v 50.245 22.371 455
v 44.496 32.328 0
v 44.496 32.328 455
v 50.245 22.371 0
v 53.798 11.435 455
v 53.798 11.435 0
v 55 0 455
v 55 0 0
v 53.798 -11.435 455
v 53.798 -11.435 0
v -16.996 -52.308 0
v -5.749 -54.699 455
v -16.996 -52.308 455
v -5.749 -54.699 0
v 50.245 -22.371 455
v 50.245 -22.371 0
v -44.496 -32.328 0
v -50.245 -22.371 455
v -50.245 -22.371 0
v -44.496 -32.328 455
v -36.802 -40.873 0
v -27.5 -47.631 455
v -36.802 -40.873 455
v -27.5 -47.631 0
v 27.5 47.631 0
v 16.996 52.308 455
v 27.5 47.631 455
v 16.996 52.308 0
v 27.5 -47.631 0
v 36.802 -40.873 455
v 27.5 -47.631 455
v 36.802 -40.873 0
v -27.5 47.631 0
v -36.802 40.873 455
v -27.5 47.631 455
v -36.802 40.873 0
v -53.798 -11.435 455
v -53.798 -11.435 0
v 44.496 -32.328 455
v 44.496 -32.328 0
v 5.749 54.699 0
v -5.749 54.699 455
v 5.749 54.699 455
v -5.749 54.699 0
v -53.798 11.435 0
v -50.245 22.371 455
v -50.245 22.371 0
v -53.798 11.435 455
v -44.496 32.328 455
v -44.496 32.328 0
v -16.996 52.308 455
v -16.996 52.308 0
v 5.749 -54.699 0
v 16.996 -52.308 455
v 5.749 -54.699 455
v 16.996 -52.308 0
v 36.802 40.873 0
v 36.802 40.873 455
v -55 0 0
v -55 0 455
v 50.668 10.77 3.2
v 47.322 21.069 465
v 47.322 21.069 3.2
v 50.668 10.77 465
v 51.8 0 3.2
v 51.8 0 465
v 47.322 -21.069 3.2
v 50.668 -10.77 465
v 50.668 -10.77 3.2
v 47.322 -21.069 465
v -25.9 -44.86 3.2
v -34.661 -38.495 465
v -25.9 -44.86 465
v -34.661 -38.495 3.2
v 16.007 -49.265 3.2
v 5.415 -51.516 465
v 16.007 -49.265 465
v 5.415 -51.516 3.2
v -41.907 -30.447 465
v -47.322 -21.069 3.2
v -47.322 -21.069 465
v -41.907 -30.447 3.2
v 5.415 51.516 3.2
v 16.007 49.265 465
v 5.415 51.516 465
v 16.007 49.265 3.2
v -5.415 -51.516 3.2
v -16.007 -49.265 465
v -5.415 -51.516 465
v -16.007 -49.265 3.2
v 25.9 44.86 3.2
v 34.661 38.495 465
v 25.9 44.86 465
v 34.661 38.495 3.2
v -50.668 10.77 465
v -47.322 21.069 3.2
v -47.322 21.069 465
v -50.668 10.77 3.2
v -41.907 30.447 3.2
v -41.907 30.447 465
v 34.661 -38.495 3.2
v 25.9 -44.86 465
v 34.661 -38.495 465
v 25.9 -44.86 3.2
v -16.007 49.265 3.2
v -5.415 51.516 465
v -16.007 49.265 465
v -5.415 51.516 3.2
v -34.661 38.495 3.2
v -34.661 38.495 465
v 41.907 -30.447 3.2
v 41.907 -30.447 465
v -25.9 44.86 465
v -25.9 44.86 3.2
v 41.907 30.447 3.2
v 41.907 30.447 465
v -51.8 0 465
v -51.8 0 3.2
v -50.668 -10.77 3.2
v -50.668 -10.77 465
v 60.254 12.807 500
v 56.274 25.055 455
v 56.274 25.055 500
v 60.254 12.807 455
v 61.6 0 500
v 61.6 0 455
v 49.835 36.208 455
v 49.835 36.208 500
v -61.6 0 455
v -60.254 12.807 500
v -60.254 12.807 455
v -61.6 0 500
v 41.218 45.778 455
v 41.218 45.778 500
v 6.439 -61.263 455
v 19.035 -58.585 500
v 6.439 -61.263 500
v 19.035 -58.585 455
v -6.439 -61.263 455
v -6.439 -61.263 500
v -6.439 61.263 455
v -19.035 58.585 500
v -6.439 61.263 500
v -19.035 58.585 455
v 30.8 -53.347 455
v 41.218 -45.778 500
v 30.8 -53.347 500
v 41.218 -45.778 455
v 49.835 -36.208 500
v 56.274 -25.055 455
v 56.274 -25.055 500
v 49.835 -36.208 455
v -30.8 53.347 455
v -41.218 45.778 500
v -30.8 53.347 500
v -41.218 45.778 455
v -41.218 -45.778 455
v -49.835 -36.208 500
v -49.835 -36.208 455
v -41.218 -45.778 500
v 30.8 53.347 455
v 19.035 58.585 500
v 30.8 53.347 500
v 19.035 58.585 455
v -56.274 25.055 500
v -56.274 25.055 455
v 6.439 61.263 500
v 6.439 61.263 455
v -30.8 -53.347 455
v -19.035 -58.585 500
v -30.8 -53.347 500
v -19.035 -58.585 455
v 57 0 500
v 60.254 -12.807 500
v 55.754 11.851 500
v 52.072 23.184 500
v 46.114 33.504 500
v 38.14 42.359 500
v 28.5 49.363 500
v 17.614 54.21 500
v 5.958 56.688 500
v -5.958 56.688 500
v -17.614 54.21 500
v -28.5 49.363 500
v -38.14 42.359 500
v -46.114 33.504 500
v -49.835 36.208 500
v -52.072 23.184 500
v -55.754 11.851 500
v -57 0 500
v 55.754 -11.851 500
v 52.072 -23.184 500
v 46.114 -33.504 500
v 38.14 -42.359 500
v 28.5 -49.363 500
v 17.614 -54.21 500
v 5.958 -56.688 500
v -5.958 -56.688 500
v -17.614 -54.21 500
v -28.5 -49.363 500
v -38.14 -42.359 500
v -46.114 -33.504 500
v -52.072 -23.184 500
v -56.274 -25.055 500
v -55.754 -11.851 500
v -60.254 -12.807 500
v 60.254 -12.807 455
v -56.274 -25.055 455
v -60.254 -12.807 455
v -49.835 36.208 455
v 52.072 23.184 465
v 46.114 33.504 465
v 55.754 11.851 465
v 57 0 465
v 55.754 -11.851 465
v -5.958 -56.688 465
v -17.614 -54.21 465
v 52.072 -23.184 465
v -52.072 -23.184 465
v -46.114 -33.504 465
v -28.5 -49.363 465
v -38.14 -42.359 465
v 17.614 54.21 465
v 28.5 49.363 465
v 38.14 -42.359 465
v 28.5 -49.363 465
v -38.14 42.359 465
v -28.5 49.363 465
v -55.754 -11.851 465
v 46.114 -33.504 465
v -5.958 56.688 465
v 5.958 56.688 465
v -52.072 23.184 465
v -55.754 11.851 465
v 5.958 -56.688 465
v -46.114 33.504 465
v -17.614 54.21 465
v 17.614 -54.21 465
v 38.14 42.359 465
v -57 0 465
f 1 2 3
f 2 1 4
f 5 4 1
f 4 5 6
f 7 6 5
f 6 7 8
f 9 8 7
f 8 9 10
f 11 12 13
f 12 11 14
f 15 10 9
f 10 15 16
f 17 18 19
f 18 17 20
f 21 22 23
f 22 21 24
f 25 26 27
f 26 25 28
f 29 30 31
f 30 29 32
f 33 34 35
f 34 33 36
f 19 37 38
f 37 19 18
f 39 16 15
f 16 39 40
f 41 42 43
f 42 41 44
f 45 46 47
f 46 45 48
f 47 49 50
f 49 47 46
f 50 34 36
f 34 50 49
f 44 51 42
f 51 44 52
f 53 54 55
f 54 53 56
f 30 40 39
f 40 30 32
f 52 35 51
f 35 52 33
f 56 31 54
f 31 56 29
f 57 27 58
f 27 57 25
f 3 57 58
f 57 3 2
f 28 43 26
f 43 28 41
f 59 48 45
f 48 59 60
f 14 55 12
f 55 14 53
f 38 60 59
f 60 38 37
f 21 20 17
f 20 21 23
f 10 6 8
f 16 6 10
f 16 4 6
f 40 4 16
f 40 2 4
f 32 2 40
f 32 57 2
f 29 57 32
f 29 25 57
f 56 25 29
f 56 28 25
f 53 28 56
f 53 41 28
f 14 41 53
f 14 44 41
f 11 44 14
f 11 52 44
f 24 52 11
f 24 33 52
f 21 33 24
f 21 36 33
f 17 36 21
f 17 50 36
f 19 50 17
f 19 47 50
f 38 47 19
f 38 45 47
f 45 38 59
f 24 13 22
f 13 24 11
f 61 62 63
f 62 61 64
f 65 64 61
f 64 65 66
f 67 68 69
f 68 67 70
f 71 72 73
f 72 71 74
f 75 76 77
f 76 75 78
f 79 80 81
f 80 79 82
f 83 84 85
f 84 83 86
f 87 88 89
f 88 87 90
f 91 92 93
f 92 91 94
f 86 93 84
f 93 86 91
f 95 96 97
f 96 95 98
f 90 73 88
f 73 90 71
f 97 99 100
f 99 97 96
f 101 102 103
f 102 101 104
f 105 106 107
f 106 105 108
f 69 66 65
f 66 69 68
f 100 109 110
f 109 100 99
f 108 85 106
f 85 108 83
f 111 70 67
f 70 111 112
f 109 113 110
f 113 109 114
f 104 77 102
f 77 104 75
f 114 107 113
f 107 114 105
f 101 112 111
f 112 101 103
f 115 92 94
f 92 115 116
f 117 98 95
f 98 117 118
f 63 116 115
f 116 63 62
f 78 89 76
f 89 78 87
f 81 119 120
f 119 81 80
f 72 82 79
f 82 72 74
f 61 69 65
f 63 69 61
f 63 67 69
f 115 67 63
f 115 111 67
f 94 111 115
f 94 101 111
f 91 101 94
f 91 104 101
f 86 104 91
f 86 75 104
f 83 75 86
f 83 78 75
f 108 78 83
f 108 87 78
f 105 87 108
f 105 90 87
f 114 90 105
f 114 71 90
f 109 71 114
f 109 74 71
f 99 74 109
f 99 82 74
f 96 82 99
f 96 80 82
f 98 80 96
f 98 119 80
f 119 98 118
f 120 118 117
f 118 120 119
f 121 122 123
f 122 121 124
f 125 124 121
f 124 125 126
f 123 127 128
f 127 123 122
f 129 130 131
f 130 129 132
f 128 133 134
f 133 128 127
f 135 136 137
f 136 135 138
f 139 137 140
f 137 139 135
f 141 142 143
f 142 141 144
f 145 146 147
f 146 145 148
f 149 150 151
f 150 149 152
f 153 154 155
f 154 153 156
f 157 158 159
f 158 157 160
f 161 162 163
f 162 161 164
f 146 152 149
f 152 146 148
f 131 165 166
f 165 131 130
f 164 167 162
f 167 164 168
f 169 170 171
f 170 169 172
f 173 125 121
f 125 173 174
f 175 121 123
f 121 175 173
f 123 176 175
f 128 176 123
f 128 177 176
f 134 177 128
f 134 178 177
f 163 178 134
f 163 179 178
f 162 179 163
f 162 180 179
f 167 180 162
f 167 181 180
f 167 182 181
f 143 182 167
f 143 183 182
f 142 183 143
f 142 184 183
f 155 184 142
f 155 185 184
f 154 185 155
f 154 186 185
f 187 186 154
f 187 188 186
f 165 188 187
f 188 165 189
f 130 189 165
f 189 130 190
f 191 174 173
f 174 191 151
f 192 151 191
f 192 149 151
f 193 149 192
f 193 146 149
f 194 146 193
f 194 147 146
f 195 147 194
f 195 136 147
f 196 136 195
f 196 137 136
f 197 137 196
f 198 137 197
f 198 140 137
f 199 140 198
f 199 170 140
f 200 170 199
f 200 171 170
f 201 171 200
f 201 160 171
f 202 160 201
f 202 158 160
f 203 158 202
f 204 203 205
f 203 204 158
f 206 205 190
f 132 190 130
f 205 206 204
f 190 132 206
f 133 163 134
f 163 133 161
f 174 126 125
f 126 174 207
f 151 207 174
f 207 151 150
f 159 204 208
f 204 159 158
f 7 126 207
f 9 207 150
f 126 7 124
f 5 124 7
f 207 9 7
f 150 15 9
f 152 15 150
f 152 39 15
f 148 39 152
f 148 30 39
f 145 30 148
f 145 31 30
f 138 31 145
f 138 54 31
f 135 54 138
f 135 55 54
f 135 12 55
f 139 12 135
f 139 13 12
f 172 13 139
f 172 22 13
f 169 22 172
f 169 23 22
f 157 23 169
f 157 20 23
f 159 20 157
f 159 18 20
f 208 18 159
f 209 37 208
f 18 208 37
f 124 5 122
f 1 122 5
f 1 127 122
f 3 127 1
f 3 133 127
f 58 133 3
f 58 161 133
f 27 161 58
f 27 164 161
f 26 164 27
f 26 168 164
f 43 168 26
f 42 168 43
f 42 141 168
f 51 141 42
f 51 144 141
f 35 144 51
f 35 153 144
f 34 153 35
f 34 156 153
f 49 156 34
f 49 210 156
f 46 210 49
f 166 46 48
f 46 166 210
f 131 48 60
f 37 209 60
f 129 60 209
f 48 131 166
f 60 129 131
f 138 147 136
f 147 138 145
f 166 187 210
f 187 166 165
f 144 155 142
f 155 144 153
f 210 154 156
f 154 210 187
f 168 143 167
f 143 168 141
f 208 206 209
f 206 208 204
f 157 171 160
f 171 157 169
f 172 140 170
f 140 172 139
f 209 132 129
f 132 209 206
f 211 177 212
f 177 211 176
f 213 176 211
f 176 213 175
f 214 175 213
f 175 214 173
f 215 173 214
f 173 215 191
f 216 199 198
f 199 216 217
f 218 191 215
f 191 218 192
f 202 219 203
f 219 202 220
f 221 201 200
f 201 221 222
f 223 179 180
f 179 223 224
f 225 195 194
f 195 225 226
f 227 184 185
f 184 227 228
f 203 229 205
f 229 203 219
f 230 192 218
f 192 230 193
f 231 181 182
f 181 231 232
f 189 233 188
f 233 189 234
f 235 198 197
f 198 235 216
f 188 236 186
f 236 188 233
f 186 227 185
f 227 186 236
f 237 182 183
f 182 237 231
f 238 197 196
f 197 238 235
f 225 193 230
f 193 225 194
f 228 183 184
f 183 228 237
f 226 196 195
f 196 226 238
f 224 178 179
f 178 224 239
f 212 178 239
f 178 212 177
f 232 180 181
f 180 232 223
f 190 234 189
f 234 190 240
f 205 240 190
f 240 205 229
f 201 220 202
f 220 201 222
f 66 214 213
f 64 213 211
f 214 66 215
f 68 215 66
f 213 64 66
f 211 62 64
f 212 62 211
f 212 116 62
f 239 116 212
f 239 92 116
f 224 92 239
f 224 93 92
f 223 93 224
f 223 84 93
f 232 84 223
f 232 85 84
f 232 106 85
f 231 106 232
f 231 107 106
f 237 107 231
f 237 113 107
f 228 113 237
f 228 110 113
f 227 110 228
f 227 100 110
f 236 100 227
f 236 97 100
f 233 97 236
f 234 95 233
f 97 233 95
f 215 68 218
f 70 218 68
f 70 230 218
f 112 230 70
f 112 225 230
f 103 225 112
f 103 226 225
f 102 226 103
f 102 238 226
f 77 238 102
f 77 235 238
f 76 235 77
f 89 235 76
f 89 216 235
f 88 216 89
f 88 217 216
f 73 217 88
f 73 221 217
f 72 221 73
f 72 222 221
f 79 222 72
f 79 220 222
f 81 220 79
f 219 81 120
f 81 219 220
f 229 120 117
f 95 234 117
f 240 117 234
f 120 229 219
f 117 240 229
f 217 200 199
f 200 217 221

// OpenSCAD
// Parameters
length_mm = 500; //[250:1000:1]
pipe_od_mm = 110; //[90:160:1]
wall_thickness_mm = 3.2; //[1.6:6.4:0.1]
include_end_fitting = 1; //[0:1:1]
fitting_length_mm = 45; //[25:90:1]
fitting_od_scale = 1.12; //[1.05:1.25:0.01]
socket_wall_extra_mm = 2.0; //[0.5:5.0:0.1]
socket_depth_mm = 35; //[15:70:1]
overlap_mm = 1.0; //[0.5:2.0:0.1]

// Module for the HT Pipe
module ht_pipe() {
  color([0.85, 0.85, 0.8]) { // PVC color
    // Hollow tube body
    difference() {
      cylinder(r=pipe_od_mm/2, h=length_mm - include_end_fitting*fitting_length_mm + overlap_mm, center=false);
      translate([0, 0, wall_thickness_mm])
        cylinder(r=pipe_od_mm/2 - wall_thickness_mm, h=length_mm - include_end_fitting*fitting_length_mm + overlap_mm, center=false);
    }
    
    // End fitting
    if (include_end_fitting) {
      difference() {
        translate([0, 0, length_mm - fitting_length_mm])
          cylinder(r=(pipe_od_mm*fitting_od_scale)/2, h=fitting_length_mm, center=false);
        translate([0, 0, length_mm - socket_depth_mm])
          cylinder(r=pipe_od_mm/2 + socket_wall_extra_mm, h=socket_depth_mm, center=false);
        translate([0, 0, length_mm - fitting_length_mm])
          cylinder(r=pipe_od_mm/2 - wall_thickness_mm, h=fitting_length_mm + overlap_mm, center=false);
      }
    }
  }
}

// Assembly
module assembly() {
  ht_pipe();
}

assembly();
